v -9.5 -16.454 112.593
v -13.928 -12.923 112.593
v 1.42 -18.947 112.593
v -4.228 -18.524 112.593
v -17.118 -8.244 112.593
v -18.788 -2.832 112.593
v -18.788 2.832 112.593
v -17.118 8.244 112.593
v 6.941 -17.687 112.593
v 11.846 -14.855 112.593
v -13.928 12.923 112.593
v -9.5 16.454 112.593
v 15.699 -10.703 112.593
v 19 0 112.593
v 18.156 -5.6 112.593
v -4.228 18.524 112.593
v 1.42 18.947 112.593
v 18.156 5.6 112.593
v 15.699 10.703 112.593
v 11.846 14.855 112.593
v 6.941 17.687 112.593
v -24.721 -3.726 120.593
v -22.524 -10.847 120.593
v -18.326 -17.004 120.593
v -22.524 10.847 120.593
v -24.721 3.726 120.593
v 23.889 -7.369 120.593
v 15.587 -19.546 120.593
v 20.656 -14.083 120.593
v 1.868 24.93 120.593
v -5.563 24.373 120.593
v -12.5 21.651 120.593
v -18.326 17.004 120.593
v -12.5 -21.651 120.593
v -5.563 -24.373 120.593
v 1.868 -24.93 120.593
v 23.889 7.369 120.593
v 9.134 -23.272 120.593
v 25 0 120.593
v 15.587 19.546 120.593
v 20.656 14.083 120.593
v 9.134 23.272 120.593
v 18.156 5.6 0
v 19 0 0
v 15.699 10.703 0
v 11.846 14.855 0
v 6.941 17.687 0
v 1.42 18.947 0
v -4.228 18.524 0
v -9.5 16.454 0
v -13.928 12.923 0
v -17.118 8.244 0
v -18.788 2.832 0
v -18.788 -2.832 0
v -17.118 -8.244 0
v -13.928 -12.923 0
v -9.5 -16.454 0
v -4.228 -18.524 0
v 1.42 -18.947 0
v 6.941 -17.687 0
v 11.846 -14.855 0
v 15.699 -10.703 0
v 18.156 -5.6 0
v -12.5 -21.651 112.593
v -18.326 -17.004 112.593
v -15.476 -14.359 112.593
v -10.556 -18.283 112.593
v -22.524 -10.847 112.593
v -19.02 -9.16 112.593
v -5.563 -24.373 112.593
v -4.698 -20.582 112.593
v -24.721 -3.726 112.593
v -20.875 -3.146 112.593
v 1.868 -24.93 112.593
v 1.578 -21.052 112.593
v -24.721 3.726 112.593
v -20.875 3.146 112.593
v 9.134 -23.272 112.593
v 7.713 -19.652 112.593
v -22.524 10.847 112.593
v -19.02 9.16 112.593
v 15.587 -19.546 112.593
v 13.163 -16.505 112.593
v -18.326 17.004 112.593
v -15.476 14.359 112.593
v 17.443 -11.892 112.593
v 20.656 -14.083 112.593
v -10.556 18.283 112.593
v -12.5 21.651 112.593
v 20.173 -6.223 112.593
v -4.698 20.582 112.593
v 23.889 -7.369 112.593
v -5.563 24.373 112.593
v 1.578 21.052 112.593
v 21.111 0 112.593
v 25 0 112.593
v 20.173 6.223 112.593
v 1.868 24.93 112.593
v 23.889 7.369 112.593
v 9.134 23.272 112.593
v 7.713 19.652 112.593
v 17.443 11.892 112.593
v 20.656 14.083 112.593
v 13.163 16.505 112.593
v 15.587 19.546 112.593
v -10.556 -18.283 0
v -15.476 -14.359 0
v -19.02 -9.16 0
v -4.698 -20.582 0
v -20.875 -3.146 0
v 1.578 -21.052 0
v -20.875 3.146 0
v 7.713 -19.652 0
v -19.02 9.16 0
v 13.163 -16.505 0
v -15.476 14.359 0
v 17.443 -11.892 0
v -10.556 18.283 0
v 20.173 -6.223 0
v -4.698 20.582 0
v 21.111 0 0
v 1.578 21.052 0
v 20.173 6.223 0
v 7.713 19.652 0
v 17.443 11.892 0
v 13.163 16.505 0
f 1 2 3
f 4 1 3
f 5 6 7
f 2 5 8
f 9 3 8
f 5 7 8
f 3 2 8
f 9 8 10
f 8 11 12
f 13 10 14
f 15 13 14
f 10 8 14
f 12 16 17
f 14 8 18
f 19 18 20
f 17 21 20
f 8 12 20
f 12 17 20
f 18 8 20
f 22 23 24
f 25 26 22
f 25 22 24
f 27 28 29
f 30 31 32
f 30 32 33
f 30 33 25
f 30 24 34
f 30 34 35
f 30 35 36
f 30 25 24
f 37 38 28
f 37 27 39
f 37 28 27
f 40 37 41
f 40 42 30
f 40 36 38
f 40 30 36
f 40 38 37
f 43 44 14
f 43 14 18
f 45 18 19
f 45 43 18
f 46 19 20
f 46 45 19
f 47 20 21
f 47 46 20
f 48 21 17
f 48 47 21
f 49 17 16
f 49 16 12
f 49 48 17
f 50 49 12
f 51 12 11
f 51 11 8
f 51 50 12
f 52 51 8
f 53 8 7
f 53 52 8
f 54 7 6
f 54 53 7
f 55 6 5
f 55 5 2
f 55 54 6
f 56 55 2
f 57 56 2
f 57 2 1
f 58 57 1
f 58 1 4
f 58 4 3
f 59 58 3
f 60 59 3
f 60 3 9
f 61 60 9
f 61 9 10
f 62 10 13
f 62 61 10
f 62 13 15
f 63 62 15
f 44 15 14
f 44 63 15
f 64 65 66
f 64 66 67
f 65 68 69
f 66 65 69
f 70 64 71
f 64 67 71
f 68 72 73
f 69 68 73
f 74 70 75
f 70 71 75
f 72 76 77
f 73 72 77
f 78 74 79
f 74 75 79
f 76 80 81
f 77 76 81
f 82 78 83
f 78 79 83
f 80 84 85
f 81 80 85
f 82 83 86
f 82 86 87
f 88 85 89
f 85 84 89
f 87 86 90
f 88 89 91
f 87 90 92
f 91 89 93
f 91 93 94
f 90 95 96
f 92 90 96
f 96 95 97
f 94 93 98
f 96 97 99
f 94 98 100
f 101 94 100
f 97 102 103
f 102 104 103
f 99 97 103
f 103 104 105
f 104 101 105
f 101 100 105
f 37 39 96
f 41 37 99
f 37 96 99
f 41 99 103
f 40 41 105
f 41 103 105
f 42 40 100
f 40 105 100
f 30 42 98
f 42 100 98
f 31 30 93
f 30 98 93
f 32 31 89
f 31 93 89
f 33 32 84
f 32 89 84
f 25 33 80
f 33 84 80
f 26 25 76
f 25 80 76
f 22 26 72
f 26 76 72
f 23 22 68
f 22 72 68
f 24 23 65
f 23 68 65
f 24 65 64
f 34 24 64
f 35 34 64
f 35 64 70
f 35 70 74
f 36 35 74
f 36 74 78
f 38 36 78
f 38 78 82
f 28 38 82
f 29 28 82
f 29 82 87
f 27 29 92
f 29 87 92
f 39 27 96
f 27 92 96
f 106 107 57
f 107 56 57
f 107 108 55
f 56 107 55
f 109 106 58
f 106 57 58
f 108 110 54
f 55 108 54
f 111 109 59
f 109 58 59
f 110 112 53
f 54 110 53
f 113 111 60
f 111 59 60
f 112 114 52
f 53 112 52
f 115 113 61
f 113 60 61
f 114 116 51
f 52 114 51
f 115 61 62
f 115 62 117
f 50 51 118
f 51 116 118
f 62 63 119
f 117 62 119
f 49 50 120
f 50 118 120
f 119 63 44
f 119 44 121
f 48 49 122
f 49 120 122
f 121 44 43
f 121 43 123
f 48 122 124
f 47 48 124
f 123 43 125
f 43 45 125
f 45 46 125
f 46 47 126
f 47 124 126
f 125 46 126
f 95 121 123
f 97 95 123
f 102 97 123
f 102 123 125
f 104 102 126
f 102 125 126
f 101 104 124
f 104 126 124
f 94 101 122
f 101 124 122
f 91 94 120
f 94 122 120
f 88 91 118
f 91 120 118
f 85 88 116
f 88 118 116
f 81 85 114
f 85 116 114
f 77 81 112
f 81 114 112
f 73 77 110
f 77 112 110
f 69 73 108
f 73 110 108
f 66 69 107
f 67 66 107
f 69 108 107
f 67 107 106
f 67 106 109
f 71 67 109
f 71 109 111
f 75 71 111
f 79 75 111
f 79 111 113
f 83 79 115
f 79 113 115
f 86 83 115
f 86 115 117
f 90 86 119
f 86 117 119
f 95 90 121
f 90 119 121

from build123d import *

# Parameters (mm, degrees)
SKETCH1_R           = 30
SKETCH1_R_2         = 27
BOSS_EXTRUDE1_DEPTH = 160
SCALE1_SCALE        = 0.703703704
SKETCH3_R           = 25
BOSS_EXTRUDE4_DEPTH = 8


with BuildPart() as part:
    # Sketch1 → Boss-Extrude1 (new body)
    with BuildSketch(Plane.XY):
        Circle(SKETCH1_R)
        Circle(SKETCH1_R_2, mode=Mode.SUBTRACT)
    extrude(amount=BOSS_EXTRUDE1_DEPTH)


with BuildPart() as part_1:
    # Scale1: scaled about (0, 0, 0)
    add(part.part.scale(SCALE1_SCALE))

    # Sketch3 → Boss-Extrude4 (add)
    with BuildSketch(Plane.XY.offset(112.592592607)):
        Circle(SKETCH3_R)
    extrude(amount=BOSS_EXTRUDE4_DEPTH)


solid = part_1.part
